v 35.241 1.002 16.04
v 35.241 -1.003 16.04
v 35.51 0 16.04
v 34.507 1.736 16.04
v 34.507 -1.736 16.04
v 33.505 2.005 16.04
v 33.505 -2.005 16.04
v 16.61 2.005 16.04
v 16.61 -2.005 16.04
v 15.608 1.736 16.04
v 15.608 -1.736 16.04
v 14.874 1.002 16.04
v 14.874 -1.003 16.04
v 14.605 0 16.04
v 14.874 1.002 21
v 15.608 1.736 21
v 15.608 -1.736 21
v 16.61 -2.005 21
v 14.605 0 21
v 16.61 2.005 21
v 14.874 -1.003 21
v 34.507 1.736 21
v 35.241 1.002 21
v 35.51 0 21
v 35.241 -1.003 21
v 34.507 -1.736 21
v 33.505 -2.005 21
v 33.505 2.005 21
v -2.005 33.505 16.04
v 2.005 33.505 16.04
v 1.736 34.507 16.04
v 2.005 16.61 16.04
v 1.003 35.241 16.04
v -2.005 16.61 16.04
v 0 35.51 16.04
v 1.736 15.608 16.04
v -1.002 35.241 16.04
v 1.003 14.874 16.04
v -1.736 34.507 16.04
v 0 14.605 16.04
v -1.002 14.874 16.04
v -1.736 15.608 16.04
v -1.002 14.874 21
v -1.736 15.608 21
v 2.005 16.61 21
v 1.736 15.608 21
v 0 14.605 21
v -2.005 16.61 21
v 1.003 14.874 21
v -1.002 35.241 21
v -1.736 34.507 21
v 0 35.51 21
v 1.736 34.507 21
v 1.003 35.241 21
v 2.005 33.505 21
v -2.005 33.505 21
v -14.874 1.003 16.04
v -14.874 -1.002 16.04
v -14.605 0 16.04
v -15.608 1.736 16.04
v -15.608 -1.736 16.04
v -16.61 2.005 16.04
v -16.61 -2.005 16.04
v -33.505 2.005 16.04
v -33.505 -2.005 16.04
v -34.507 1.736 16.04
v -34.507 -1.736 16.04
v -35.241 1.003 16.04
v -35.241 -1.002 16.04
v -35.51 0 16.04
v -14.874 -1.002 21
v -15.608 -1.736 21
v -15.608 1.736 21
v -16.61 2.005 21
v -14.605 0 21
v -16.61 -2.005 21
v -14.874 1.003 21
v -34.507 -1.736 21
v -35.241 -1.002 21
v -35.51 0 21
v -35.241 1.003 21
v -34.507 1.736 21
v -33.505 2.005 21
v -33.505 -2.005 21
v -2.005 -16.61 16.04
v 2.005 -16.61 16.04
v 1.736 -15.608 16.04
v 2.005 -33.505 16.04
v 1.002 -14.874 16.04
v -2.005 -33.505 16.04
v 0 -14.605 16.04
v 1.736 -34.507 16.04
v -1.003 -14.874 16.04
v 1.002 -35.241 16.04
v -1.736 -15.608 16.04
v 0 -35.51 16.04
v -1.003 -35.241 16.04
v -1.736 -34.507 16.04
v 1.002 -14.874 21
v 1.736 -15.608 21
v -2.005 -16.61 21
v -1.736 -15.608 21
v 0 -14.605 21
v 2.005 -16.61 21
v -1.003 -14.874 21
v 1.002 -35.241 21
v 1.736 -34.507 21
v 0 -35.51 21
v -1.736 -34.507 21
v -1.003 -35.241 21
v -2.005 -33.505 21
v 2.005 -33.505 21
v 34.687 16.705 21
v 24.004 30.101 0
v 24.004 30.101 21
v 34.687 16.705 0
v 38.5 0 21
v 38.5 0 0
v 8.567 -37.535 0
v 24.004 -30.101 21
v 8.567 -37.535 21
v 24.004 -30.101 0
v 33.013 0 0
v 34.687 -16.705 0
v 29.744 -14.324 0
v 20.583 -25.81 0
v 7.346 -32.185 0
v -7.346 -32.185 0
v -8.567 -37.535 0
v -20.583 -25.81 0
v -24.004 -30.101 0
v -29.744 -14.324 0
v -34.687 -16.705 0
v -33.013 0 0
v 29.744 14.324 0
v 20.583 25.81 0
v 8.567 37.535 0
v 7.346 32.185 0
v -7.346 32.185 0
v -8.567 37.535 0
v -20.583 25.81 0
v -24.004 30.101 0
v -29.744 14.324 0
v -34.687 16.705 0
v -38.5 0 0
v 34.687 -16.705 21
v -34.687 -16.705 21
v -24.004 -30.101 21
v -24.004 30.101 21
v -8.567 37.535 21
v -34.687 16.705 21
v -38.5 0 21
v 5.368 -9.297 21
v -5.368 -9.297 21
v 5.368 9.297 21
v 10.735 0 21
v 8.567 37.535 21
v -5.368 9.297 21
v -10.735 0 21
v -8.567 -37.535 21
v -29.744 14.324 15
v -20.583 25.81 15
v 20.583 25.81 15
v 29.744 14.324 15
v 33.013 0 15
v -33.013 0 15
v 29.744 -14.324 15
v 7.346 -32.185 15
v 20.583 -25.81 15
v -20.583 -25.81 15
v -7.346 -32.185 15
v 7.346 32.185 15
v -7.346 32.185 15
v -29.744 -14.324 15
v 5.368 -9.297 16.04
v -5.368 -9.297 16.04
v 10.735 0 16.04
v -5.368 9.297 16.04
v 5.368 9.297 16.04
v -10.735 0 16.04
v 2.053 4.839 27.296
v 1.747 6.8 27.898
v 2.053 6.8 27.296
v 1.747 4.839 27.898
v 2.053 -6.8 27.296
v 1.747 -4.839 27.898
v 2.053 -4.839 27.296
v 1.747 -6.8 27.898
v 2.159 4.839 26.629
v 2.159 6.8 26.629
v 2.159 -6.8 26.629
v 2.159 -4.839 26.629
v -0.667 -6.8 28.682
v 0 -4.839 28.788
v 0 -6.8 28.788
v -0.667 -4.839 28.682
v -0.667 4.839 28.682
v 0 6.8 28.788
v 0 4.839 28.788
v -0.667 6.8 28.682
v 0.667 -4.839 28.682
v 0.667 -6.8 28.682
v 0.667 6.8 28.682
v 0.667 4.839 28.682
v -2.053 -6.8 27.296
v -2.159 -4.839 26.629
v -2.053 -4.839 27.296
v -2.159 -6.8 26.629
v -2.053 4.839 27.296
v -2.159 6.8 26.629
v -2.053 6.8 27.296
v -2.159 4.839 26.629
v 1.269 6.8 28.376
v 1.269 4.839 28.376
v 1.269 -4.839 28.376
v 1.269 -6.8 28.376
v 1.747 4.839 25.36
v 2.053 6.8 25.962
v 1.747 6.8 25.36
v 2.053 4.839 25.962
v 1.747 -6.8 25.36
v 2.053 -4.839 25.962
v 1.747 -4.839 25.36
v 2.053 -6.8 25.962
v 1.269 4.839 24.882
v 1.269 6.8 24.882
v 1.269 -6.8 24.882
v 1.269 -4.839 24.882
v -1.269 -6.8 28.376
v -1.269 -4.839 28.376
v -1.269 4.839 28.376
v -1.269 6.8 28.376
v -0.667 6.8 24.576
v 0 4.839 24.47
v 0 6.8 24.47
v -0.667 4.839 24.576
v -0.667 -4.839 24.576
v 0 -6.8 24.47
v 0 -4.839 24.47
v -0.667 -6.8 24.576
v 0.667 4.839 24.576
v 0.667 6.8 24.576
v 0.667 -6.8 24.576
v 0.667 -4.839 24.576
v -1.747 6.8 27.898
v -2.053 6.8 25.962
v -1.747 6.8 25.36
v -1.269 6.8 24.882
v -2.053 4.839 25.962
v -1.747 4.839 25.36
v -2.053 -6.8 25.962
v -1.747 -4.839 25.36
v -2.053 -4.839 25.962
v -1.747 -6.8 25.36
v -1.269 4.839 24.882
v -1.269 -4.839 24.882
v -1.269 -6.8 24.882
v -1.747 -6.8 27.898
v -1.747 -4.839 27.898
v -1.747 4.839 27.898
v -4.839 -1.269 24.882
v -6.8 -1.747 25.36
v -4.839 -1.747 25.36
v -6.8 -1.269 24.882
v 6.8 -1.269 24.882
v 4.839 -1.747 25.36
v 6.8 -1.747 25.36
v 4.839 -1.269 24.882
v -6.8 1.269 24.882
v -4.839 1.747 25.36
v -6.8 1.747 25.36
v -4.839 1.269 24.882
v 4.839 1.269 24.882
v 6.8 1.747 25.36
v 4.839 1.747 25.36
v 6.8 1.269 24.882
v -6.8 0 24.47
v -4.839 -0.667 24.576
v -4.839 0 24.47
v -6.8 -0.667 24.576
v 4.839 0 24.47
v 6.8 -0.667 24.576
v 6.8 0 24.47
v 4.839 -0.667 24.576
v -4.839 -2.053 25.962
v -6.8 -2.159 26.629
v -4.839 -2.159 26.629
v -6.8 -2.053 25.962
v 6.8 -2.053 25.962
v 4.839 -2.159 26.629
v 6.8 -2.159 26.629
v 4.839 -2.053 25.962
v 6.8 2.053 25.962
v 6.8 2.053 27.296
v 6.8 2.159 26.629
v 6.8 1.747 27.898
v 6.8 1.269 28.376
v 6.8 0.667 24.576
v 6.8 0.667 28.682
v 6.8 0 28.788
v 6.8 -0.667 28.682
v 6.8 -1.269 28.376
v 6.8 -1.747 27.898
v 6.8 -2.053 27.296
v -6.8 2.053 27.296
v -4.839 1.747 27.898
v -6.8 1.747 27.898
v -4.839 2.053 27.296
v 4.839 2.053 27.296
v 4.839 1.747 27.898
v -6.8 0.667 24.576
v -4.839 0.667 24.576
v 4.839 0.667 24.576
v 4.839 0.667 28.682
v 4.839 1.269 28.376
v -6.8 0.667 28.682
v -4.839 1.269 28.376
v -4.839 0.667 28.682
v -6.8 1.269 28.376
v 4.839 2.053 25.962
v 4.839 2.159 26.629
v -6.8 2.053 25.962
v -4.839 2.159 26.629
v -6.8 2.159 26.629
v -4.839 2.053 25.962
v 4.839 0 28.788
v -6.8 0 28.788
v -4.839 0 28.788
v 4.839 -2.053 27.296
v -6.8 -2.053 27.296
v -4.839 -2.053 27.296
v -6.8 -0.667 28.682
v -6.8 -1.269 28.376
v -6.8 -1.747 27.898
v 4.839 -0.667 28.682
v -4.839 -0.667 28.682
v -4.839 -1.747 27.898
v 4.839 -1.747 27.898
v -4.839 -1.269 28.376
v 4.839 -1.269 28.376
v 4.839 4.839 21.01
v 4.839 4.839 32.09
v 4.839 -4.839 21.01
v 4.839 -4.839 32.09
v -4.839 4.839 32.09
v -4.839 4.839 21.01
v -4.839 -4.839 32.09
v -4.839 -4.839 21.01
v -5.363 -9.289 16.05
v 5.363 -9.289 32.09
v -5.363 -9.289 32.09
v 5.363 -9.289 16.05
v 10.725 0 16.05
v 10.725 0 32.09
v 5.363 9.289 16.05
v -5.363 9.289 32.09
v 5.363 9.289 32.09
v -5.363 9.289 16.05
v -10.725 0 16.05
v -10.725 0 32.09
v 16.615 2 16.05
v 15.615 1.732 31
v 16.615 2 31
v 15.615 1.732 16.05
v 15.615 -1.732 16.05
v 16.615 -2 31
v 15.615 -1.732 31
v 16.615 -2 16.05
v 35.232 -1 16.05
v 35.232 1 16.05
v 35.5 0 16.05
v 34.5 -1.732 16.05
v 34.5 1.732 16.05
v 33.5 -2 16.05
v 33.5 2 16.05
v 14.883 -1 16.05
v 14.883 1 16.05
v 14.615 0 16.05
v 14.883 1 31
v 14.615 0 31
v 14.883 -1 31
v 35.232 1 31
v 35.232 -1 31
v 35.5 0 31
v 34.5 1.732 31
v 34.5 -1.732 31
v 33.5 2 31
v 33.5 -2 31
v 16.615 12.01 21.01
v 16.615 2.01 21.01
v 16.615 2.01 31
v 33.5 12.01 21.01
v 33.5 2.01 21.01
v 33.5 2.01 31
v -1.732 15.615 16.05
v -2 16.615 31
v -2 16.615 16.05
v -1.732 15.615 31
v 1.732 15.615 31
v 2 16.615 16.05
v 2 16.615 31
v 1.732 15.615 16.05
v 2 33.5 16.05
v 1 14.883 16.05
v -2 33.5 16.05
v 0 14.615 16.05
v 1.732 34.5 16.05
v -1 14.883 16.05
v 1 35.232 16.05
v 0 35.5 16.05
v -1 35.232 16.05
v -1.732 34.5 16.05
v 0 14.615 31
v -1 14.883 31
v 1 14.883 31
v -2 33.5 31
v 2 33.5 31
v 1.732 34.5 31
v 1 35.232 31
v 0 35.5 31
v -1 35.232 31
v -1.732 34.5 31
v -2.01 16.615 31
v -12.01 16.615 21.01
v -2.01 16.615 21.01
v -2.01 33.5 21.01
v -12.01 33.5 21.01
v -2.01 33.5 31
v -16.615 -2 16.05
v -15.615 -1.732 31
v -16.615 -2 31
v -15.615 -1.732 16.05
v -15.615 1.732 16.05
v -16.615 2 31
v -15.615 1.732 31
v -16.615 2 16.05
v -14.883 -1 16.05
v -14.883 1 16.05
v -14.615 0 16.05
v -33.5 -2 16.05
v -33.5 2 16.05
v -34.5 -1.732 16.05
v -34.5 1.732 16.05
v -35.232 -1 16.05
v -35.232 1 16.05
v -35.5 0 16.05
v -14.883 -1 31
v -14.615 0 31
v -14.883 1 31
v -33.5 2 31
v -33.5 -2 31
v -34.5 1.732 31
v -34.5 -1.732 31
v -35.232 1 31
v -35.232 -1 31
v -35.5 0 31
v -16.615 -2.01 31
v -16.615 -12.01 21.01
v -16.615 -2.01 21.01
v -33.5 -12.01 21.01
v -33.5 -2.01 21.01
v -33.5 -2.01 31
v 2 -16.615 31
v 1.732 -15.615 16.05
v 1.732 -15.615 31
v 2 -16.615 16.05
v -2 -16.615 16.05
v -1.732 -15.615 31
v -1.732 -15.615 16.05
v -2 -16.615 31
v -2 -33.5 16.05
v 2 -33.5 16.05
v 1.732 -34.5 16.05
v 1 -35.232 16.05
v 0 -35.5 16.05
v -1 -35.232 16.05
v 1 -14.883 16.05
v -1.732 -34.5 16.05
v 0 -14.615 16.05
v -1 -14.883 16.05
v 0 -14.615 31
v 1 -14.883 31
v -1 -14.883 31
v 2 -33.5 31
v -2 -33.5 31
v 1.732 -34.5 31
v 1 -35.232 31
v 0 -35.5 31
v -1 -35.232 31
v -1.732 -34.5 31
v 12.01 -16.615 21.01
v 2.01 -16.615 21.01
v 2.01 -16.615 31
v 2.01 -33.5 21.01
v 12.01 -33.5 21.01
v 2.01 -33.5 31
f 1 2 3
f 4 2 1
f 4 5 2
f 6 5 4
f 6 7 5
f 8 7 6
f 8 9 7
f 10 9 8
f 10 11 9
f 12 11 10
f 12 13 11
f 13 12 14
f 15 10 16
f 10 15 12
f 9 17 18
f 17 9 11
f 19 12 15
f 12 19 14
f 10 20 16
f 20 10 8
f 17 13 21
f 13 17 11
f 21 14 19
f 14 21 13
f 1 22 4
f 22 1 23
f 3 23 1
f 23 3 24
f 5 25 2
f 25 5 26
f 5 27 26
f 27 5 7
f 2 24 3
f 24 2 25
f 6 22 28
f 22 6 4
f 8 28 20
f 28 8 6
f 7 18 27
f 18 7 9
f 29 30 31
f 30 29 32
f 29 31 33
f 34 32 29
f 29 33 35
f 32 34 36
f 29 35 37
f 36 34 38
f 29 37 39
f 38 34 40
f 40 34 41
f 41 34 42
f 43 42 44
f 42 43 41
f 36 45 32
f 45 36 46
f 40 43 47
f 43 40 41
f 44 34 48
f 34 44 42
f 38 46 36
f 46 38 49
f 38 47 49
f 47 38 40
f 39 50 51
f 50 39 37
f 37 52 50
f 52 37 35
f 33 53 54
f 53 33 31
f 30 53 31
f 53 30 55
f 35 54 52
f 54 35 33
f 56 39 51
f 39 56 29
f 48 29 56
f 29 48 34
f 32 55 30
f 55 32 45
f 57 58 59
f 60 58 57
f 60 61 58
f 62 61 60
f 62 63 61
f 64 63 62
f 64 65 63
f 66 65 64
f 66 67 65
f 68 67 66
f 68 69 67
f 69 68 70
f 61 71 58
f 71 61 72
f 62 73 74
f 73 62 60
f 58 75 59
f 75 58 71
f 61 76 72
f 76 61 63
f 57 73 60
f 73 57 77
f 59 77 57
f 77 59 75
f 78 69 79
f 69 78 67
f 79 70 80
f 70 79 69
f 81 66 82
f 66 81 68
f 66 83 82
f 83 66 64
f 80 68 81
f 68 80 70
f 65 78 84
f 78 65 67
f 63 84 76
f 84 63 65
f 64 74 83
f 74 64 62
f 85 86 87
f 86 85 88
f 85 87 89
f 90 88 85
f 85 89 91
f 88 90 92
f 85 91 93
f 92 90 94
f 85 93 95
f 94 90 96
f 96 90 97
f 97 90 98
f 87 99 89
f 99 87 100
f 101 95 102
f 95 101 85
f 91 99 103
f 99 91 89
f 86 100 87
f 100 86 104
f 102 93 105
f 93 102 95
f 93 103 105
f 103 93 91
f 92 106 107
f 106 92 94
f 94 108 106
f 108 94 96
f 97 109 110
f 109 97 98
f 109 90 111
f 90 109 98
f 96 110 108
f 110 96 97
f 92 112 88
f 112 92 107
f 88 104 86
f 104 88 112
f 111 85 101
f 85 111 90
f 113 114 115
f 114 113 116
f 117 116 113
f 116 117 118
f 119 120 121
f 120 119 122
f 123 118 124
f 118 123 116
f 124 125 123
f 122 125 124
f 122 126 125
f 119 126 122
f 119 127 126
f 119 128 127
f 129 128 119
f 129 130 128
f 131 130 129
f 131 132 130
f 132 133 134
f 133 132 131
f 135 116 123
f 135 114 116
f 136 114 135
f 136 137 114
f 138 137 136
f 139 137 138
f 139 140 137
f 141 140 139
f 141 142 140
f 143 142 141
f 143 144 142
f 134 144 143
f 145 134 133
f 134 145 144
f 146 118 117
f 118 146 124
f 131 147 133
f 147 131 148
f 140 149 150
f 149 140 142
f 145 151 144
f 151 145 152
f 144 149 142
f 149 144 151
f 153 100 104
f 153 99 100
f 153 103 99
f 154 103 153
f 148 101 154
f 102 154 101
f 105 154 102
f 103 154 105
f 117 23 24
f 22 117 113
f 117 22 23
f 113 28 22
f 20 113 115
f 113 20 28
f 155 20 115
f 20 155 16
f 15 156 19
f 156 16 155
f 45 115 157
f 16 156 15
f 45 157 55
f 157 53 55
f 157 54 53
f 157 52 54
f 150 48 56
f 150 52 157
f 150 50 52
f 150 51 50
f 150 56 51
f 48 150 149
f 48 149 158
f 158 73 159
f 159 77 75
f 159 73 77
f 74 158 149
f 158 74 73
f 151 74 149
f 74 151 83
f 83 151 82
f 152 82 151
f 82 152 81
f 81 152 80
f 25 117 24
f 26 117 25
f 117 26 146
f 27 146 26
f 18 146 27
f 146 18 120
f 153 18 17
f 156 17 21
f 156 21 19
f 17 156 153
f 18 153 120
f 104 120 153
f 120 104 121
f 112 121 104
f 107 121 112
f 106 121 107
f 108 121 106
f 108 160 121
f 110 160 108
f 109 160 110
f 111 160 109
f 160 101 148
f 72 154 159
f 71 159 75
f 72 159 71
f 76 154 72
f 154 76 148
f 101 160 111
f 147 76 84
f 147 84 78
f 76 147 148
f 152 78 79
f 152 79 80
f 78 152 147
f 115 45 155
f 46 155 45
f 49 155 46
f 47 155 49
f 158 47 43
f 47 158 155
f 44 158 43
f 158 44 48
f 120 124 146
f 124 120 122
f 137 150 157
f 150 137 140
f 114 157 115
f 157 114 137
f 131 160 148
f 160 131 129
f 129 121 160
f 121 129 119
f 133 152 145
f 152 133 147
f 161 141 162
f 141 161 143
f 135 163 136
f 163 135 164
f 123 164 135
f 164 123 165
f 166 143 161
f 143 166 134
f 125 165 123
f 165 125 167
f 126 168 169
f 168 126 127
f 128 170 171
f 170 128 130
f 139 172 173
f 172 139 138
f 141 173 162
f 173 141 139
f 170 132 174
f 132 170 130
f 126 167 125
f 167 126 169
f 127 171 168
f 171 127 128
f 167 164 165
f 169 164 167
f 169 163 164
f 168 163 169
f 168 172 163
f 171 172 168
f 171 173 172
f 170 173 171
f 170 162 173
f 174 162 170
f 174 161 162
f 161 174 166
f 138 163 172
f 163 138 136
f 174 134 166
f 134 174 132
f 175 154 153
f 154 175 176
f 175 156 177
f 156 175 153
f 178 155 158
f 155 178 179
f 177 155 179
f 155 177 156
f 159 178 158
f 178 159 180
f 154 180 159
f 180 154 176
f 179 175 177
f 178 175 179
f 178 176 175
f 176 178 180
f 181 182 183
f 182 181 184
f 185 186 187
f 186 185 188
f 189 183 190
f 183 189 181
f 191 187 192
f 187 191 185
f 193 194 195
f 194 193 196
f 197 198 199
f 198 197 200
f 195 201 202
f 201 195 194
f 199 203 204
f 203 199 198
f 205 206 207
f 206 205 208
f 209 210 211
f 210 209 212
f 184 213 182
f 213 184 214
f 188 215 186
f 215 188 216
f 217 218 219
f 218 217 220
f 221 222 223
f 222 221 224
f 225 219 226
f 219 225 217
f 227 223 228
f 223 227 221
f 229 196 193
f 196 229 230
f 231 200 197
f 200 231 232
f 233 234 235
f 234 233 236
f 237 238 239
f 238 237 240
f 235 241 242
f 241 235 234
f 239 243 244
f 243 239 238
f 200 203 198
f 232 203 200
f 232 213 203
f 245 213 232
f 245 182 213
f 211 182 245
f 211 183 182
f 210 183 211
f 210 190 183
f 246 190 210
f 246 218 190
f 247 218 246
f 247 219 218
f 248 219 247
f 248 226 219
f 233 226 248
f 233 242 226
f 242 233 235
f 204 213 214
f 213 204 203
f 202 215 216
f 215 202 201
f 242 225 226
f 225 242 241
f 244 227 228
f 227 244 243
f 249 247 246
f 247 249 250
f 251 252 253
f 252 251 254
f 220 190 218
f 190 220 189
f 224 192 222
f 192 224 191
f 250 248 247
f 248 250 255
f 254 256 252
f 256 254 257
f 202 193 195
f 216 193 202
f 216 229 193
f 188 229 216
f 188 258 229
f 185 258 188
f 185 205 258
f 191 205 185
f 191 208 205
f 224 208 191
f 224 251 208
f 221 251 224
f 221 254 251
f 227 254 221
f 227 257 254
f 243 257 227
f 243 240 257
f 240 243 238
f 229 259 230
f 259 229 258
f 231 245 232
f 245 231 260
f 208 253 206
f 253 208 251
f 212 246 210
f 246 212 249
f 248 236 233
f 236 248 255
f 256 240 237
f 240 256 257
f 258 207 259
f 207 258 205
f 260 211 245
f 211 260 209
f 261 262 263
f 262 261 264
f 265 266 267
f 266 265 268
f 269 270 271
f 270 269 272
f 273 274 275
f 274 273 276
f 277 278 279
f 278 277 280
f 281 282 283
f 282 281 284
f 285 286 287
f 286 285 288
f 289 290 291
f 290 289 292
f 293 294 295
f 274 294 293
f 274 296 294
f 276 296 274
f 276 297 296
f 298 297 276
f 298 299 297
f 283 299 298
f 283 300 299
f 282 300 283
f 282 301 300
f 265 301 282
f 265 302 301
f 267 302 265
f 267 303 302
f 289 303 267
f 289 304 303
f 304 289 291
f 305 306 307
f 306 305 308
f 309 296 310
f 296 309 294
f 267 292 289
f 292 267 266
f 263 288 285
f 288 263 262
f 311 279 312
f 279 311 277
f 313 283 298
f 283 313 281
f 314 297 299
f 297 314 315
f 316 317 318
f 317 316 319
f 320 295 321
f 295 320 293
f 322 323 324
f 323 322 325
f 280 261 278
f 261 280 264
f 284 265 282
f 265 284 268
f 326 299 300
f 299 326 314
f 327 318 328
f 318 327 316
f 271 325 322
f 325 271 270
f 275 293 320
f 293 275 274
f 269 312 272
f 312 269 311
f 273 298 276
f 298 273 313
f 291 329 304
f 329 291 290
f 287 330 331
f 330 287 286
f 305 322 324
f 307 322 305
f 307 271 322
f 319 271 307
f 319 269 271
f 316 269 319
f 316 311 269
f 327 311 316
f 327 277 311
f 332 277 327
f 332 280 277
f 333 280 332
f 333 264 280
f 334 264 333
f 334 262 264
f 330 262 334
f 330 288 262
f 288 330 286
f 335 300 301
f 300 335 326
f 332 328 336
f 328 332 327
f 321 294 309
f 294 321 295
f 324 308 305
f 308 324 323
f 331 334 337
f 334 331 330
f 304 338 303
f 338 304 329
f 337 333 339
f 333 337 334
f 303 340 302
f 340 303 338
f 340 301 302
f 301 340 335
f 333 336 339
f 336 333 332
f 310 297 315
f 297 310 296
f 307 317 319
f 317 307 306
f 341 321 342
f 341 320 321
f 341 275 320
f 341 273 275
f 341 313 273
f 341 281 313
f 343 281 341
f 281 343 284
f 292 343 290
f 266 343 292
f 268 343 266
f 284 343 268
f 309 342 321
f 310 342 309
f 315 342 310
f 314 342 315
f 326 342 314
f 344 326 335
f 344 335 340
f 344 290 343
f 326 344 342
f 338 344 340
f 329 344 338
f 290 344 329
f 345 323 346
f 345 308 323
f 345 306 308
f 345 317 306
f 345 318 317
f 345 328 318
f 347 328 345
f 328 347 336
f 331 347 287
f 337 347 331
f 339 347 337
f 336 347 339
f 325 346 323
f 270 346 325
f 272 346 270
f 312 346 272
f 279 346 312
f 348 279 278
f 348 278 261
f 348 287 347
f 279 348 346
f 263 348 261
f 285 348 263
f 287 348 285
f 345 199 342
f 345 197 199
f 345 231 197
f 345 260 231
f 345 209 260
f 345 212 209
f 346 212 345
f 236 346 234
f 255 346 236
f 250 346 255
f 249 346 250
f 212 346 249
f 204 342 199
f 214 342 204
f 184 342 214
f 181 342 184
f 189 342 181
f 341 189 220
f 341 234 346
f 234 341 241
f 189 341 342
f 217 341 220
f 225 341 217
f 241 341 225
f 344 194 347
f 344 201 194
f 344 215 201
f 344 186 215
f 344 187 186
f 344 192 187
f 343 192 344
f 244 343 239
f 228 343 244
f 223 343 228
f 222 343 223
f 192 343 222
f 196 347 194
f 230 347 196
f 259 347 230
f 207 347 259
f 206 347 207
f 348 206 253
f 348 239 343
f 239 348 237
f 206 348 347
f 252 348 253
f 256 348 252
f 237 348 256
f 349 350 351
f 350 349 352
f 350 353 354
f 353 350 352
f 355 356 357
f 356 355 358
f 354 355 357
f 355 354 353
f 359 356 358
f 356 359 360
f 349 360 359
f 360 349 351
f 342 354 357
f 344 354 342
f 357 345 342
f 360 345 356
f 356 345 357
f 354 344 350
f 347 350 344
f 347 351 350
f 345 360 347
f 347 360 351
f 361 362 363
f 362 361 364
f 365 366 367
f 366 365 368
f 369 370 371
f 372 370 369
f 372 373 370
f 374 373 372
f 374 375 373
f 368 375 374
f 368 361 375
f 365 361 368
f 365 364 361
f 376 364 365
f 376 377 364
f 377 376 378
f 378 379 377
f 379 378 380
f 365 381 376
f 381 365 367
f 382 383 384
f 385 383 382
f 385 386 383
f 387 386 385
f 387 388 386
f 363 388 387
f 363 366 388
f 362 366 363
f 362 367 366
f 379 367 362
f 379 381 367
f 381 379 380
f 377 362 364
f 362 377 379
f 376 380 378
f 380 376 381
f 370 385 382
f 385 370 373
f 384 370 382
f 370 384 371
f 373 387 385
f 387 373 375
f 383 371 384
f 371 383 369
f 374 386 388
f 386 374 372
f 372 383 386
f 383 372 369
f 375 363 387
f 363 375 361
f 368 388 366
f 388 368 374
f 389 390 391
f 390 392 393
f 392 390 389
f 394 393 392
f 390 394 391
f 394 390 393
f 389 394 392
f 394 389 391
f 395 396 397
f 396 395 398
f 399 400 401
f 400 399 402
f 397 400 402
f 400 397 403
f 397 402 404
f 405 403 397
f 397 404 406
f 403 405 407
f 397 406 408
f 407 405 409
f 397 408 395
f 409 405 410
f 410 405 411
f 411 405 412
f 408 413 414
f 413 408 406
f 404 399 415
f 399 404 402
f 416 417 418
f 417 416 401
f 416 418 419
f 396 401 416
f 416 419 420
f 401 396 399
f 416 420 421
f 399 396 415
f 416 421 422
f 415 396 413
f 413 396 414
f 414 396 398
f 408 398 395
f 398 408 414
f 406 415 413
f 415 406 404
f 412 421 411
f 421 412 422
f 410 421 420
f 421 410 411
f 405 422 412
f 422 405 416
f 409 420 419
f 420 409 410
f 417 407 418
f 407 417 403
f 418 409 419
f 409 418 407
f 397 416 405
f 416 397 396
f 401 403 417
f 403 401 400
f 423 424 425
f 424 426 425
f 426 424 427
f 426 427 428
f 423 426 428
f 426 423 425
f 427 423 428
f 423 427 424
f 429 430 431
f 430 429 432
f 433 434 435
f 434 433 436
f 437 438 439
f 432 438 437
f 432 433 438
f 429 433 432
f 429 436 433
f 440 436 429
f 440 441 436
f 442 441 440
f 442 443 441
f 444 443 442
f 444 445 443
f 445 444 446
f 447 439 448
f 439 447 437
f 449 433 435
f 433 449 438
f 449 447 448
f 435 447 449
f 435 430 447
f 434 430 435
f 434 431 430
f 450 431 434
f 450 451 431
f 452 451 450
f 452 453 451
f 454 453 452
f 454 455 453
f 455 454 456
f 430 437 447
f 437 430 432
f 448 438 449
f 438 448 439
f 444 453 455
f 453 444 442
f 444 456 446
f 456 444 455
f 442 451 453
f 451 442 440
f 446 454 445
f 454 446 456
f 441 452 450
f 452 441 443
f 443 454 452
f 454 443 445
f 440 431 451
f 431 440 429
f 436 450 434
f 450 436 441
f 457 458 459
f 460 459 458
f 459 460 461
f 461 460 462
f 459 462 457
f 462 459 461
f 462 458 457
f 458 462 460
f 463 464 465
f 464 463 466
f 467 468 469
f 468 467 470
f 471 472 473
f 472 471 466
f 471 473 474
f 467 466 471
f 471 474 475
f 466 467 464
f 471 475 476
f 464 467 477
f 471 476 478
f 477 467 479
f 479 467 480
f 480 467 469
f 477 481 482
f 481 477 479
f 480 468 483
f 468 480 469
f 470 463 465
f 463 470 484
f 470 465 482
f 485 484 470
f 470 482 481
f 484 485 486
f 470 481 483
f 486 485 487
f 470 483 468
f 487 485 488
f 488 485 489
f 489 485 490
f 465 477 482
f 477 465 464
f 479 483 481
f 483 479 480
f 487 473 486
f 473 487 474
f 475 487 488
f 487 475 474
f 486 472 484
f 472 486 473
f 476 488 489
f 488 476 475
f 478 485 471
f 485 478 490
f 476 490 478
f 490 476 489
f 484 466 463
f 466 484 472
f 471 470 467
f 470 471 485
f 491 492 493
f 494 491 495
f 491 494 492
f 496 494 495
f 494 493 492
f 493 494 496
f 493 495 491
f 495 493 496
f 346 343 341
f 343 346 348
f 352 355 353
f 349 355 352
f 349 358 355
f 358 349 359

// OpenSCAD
/*this is still pretty ugly code.
    I have not done testing of the fit and strength of these parts.
    I still have lots of code cleanup to do also :-) i.e. (Don't look too close!)
    Please let me know in the comments on Thingiverse if you have trouble with fit or function
    or if you need additional selections available in the Customizer
    If you use OpenSCAD you can probably find the variables to adjust somewhere below
    to customize this as desired.
*/
/*V1.1
Added customization options, such as whether to include the square drive hole, or not.
Additional selections for nut size and filter diameters
*/
/*V1.0
rewrote the grips() module for better clarity and such that the 
MCAD library is not required. I didn't like the right triangle or
rounded box implementation that I was using from there because it 
was sometimes unclear how large the generated objects would be and I
needed to be able to precisely make the cutouts for the grips.
that has been corrected.
Final part should always consist of 10 meshes.
Each grip is 2 independent meshes, and so is the nut in the center.
*/
/*V0.7
Corrected a bug in 0.6 that cause traingular struts to be 1 mm too high above top
*/
/*V0.6
Just cleaned up the part by covering the interior bottom with bot_thk, about 1mm
of plastic so that the structure didn't show through
*/
//V0.5 First usable release
//Finger grips should be plenty strong to use for removing filters.
//no guarantees on the nut, or 3/8" driver strength, but it has been made much stronger
//model is actually 10 separate structures. The parts extend through the top of the wrench
//with their own walls for added strength, almost like they are press-fit into place.
//In this version, I allowed them to extend through the bottom surface for visibility as well.
//Also not that in order to prevent some potential non-manifold issues when using the rounded boxes, 
//I had to leave largish gaps around the finger grips. You may see some light though the edges.
//This is "normal" at this time, and will not cause any functional problems.
//Changes:
//Made nut size selectable in customizer, 19 mm or 21 mm.
//Set default clearance across flats default to 1.0 mm
//This is an easy place to fine tune the size if your printer makes opening a little too small, e.g.
//I recommend you first print just a couple of layers and then check the size, either with a new filter
//or with calipers.
//distance across points should be the nominal size, eg 65 mm + just a little clearance, maybe 0.5 mm so it fits snugly.

//V0.4
//Changes:
// Corrected the dimples module for() loop
// patched in my stronger mesh-in-mesh structure for the nut and finger grips.
// known issue: use of foo variable to wallow out hole is ugly
// values less than 0.2 mm result in non-manifold shape!
// This arises from use of rounded_box from MCAD/Shapes.scad
//
//V0.3 
//Changes:
//V0.3 added clearance parameter to let filter fit inside wrench (duh!)
//V0.4 added new internal structural supports to nut and finger grips.
//code is ugly. Sorry. It's a learning project and I've let it get away from me
//as I explored some new techniques I'm developing for multi-mesh structural supports.

/* [Size] */
//Diameter of round part of filter in mm
filterSize=65;//[65,74,76]
//How much clearance across flats? (mm)
ClearanceAF=1.0;//[0:0.1:2]
//Size of nut? (mm)
nutSize=19;//[12,13,15,17,19,21]
//Add Square Drive?
squaredrive=1; // [1:yes, 0:no]
//Customizer doesn't support booleans, thus the use of 0 or 1 choice here

/* [Hidden] */

mmPerInch=25.4;
squareDrive=(squaredrive==1 && (nutSize>=15));//3/8" drive will not fit smaller than 15mm nut

capWrench(diameter=filterSize, Clearance=ClearanceAF, nut=nutSize, squareDrive=squareDrive);
epsilon =   0.01;//to prevent ambiguous surfaces
bot_thk =   1.05; //amount of material, part of thickness, that is not impaled by the structures
    
module capWrench(diameter=74, Clearance=1,
                flutes=14, thickness=6.0, top=21,
                nut=19, squareDrive=true, eps=epsilon){
      
    r1=diameter/2+thickness;            //outer radius 
    r2=(diameter + Clearance*1.0257)/2; //inner radius
    color([.75,.75,.5])
         
                    
    //cap "socket" to fit filter
    //difference will not only cut the main opening, but also opens up the 
    //holes for inserting our fittings, the nut, and finger grips
    //these recesses will cause the slicer to generate wall structures extending under the surface for much greater strength
    difference(){
        cylinder(r=r1,h=top,$fn=flutes);//main solid body
        translate([0,0,-eps])
        cylinder(r=r2,h=top-thickness+eps,$fn=flutes);//interior opening
        translate([0,0,top-thickness-eps+bot_thk]) //Leave about 1mm of bottom (bt_thk)
        cylinder(r=nut*1.129/2+eps,h=thickness-bot_thk+2*eps,$fn=6); //make a hex shaped hole to fit the nut through for strength
        grips(length=griplen+2*eps, height=root+2*eps, width=grip_w+eps, root=root, gripr=grip_x-eps, gripz=grip_z-eps, strut=false);
        //grips hole is sized slightly larger than grips by amount eps
   }
    //now let's fill that hole back in with a hex mesh, not part of the cap
    color([0,0,0]) //just for troubleshooting. Makes it easier to visualize that it's correct.
    translate([0,0,top-thickness+bot_thk])
    cylinder(r=nut*1.129/2,h=thickness-bot_thk+eps,$fn=6); //sticks out the top by eps to join solidly with the rest of the nut that we add next
    
    //https://www.engineersedge.com/hardware/square-drive-tools.htm is the source for some of my dimensions below
    //I'm trying to use values that will work with any driver that is in-spec
    //nut on top for socket or 3/8" drive
    nut_thk=11.1;
    //specs for ratchet driver end length are 
    //10.3 to 11.1 mm 
    drv_hole=0.381*mmPerInch; //(just over 3/8")
    //specs are .378"-.383" min to max
    //first attempt at .375 was too small
    Df=0.215*mmPerInch;
    //Depth of center of dimple or hole for plunger
    //Specs are .209"-.221"
    Em=0.170*mmPerInch;
    //minimum diameter for the hole to receive plunger
    Fm=0.156*mmPerInch;
    //maximum plunger ball diameter
    rNut=nut*1.129*0.99/2;
    //undersize nut flats by 1% to allow for slight
    //printer variances. Standards typically allow about a 4% downward variance here. 
    //Also, the 1.129 factor
    //is to convert flat-flat dimension to full
    //circle dimension for hexagon
    translate([0,0,top-eps])
    difference(){
    //hexagonal nut
    color([.75,.75,.75])
    cylinder(r=nut*1.129/2,h=nut_thk,$fn=6);
        if(squareDrive){
        //minus a square hole for driver
        cube([drv_hole,
              drv_hole,
              2*nut_thk+eps],
              center=true);    
        //and some dimples to accept a plunger ball
        dimples(depth1=nut_thk-Df,
                depth2=drv_hole+Fm,
                radius=Em/2);
        }
    }
    //now lets add the grips
    //first adjust the size to fit our wrench and nut dimensions
    griplen=r1-thickness/2-nut/1.3;
    root=thickness-bot_thk;
    gripht=10;
    gripend=r1-thickness/2;
    grip_x=gripend-griplen; //center x position
    grip_z=top-root;
    grip_w=4;
    grips(length=griplen, width=grip_w, height=gripht, root=root, gripr=grip_x, gripz=grip_z);
}
module grips(length=15, height=10, root=5,strut=true, width=4, gripr=18, gripz=15.1){
    
   //use a loop to make 4 of these.
    for(a=[0:90:270]){
        color([.25,.25,.5])
        rotate([0,0,a]) //a is 0,90,180,270
        translate([gripr,0,gripz])
        {
    //root=how deep the grip extends below the surface
    eps=0.01; //distance to separate or overlap meshes
    rad=width/2; //radius of rounding cylinders
    cubex=length-2*rad; //x dimension of the base grip cube
    triht=height-eps; //triangular strut height
    tribase=height; //triangular foot length
    //our strut is a Right Triangle with base tribase and height triht
    //strut is shifted up by eps so it doesn't join the top
    //and is also shifted away from the grip by eps to keep it separate
    //first a finger grip with round ends
    translate([rad,-width/2,0]) //center on x axis and leave room for cylinder
    {
    cube([cubex,width,height+root]);
    for(x=[0:cubex:cubex]) //a cylinder on each end for nice round shape
        translate([x,rad,0])
        cylinder(r=rad,h=height+root,$fn=12);
    }
    //Now add a right triangular strut is desired
    if (strut) {
    translate([rad,rad+eps,root+eps]) //align with cube and separate by eps
    rotate([0,90,0]) //correct orientation
    linear_extrude(height = cubex) //strut is just as wide as the 'square' part of our grip
    polygon(points = [ [0,0], [-triht,0], [0, tribase]]); //simple right triangle positioned to extrude and easily rotate into position
    }
    
}




       }

    }


module dimples(height=5.639,depth=13.6,radius=2.16){
    /*generates a pair of perpendicular cylinders
    that module CapWrench() uses to etch out
    depressions to accept a ball bearing plunger to
    snap the ratchet or driver male end into
    The defaults are just initial base case values
    derived from my nut sizing choices and
    available driver and socket engineering data.
    */
    for(x=[[90,0,0],[0,90,0]]){
         //[90,0,0] and [0,90,0] rotations for two perpendicular cylinders that punch hols in the sides of the square hole
    translate([0,0,height])    
    rotate(x) //rotate 90 degrees through x first time, 90 degrees through y axis the second time
    cylinder(r=radius, h=depth, center=true,$fn=20);//the ends of the cylinders will extend into the sides of the square 
        //drive opening and be subtracted out.
    }
}
